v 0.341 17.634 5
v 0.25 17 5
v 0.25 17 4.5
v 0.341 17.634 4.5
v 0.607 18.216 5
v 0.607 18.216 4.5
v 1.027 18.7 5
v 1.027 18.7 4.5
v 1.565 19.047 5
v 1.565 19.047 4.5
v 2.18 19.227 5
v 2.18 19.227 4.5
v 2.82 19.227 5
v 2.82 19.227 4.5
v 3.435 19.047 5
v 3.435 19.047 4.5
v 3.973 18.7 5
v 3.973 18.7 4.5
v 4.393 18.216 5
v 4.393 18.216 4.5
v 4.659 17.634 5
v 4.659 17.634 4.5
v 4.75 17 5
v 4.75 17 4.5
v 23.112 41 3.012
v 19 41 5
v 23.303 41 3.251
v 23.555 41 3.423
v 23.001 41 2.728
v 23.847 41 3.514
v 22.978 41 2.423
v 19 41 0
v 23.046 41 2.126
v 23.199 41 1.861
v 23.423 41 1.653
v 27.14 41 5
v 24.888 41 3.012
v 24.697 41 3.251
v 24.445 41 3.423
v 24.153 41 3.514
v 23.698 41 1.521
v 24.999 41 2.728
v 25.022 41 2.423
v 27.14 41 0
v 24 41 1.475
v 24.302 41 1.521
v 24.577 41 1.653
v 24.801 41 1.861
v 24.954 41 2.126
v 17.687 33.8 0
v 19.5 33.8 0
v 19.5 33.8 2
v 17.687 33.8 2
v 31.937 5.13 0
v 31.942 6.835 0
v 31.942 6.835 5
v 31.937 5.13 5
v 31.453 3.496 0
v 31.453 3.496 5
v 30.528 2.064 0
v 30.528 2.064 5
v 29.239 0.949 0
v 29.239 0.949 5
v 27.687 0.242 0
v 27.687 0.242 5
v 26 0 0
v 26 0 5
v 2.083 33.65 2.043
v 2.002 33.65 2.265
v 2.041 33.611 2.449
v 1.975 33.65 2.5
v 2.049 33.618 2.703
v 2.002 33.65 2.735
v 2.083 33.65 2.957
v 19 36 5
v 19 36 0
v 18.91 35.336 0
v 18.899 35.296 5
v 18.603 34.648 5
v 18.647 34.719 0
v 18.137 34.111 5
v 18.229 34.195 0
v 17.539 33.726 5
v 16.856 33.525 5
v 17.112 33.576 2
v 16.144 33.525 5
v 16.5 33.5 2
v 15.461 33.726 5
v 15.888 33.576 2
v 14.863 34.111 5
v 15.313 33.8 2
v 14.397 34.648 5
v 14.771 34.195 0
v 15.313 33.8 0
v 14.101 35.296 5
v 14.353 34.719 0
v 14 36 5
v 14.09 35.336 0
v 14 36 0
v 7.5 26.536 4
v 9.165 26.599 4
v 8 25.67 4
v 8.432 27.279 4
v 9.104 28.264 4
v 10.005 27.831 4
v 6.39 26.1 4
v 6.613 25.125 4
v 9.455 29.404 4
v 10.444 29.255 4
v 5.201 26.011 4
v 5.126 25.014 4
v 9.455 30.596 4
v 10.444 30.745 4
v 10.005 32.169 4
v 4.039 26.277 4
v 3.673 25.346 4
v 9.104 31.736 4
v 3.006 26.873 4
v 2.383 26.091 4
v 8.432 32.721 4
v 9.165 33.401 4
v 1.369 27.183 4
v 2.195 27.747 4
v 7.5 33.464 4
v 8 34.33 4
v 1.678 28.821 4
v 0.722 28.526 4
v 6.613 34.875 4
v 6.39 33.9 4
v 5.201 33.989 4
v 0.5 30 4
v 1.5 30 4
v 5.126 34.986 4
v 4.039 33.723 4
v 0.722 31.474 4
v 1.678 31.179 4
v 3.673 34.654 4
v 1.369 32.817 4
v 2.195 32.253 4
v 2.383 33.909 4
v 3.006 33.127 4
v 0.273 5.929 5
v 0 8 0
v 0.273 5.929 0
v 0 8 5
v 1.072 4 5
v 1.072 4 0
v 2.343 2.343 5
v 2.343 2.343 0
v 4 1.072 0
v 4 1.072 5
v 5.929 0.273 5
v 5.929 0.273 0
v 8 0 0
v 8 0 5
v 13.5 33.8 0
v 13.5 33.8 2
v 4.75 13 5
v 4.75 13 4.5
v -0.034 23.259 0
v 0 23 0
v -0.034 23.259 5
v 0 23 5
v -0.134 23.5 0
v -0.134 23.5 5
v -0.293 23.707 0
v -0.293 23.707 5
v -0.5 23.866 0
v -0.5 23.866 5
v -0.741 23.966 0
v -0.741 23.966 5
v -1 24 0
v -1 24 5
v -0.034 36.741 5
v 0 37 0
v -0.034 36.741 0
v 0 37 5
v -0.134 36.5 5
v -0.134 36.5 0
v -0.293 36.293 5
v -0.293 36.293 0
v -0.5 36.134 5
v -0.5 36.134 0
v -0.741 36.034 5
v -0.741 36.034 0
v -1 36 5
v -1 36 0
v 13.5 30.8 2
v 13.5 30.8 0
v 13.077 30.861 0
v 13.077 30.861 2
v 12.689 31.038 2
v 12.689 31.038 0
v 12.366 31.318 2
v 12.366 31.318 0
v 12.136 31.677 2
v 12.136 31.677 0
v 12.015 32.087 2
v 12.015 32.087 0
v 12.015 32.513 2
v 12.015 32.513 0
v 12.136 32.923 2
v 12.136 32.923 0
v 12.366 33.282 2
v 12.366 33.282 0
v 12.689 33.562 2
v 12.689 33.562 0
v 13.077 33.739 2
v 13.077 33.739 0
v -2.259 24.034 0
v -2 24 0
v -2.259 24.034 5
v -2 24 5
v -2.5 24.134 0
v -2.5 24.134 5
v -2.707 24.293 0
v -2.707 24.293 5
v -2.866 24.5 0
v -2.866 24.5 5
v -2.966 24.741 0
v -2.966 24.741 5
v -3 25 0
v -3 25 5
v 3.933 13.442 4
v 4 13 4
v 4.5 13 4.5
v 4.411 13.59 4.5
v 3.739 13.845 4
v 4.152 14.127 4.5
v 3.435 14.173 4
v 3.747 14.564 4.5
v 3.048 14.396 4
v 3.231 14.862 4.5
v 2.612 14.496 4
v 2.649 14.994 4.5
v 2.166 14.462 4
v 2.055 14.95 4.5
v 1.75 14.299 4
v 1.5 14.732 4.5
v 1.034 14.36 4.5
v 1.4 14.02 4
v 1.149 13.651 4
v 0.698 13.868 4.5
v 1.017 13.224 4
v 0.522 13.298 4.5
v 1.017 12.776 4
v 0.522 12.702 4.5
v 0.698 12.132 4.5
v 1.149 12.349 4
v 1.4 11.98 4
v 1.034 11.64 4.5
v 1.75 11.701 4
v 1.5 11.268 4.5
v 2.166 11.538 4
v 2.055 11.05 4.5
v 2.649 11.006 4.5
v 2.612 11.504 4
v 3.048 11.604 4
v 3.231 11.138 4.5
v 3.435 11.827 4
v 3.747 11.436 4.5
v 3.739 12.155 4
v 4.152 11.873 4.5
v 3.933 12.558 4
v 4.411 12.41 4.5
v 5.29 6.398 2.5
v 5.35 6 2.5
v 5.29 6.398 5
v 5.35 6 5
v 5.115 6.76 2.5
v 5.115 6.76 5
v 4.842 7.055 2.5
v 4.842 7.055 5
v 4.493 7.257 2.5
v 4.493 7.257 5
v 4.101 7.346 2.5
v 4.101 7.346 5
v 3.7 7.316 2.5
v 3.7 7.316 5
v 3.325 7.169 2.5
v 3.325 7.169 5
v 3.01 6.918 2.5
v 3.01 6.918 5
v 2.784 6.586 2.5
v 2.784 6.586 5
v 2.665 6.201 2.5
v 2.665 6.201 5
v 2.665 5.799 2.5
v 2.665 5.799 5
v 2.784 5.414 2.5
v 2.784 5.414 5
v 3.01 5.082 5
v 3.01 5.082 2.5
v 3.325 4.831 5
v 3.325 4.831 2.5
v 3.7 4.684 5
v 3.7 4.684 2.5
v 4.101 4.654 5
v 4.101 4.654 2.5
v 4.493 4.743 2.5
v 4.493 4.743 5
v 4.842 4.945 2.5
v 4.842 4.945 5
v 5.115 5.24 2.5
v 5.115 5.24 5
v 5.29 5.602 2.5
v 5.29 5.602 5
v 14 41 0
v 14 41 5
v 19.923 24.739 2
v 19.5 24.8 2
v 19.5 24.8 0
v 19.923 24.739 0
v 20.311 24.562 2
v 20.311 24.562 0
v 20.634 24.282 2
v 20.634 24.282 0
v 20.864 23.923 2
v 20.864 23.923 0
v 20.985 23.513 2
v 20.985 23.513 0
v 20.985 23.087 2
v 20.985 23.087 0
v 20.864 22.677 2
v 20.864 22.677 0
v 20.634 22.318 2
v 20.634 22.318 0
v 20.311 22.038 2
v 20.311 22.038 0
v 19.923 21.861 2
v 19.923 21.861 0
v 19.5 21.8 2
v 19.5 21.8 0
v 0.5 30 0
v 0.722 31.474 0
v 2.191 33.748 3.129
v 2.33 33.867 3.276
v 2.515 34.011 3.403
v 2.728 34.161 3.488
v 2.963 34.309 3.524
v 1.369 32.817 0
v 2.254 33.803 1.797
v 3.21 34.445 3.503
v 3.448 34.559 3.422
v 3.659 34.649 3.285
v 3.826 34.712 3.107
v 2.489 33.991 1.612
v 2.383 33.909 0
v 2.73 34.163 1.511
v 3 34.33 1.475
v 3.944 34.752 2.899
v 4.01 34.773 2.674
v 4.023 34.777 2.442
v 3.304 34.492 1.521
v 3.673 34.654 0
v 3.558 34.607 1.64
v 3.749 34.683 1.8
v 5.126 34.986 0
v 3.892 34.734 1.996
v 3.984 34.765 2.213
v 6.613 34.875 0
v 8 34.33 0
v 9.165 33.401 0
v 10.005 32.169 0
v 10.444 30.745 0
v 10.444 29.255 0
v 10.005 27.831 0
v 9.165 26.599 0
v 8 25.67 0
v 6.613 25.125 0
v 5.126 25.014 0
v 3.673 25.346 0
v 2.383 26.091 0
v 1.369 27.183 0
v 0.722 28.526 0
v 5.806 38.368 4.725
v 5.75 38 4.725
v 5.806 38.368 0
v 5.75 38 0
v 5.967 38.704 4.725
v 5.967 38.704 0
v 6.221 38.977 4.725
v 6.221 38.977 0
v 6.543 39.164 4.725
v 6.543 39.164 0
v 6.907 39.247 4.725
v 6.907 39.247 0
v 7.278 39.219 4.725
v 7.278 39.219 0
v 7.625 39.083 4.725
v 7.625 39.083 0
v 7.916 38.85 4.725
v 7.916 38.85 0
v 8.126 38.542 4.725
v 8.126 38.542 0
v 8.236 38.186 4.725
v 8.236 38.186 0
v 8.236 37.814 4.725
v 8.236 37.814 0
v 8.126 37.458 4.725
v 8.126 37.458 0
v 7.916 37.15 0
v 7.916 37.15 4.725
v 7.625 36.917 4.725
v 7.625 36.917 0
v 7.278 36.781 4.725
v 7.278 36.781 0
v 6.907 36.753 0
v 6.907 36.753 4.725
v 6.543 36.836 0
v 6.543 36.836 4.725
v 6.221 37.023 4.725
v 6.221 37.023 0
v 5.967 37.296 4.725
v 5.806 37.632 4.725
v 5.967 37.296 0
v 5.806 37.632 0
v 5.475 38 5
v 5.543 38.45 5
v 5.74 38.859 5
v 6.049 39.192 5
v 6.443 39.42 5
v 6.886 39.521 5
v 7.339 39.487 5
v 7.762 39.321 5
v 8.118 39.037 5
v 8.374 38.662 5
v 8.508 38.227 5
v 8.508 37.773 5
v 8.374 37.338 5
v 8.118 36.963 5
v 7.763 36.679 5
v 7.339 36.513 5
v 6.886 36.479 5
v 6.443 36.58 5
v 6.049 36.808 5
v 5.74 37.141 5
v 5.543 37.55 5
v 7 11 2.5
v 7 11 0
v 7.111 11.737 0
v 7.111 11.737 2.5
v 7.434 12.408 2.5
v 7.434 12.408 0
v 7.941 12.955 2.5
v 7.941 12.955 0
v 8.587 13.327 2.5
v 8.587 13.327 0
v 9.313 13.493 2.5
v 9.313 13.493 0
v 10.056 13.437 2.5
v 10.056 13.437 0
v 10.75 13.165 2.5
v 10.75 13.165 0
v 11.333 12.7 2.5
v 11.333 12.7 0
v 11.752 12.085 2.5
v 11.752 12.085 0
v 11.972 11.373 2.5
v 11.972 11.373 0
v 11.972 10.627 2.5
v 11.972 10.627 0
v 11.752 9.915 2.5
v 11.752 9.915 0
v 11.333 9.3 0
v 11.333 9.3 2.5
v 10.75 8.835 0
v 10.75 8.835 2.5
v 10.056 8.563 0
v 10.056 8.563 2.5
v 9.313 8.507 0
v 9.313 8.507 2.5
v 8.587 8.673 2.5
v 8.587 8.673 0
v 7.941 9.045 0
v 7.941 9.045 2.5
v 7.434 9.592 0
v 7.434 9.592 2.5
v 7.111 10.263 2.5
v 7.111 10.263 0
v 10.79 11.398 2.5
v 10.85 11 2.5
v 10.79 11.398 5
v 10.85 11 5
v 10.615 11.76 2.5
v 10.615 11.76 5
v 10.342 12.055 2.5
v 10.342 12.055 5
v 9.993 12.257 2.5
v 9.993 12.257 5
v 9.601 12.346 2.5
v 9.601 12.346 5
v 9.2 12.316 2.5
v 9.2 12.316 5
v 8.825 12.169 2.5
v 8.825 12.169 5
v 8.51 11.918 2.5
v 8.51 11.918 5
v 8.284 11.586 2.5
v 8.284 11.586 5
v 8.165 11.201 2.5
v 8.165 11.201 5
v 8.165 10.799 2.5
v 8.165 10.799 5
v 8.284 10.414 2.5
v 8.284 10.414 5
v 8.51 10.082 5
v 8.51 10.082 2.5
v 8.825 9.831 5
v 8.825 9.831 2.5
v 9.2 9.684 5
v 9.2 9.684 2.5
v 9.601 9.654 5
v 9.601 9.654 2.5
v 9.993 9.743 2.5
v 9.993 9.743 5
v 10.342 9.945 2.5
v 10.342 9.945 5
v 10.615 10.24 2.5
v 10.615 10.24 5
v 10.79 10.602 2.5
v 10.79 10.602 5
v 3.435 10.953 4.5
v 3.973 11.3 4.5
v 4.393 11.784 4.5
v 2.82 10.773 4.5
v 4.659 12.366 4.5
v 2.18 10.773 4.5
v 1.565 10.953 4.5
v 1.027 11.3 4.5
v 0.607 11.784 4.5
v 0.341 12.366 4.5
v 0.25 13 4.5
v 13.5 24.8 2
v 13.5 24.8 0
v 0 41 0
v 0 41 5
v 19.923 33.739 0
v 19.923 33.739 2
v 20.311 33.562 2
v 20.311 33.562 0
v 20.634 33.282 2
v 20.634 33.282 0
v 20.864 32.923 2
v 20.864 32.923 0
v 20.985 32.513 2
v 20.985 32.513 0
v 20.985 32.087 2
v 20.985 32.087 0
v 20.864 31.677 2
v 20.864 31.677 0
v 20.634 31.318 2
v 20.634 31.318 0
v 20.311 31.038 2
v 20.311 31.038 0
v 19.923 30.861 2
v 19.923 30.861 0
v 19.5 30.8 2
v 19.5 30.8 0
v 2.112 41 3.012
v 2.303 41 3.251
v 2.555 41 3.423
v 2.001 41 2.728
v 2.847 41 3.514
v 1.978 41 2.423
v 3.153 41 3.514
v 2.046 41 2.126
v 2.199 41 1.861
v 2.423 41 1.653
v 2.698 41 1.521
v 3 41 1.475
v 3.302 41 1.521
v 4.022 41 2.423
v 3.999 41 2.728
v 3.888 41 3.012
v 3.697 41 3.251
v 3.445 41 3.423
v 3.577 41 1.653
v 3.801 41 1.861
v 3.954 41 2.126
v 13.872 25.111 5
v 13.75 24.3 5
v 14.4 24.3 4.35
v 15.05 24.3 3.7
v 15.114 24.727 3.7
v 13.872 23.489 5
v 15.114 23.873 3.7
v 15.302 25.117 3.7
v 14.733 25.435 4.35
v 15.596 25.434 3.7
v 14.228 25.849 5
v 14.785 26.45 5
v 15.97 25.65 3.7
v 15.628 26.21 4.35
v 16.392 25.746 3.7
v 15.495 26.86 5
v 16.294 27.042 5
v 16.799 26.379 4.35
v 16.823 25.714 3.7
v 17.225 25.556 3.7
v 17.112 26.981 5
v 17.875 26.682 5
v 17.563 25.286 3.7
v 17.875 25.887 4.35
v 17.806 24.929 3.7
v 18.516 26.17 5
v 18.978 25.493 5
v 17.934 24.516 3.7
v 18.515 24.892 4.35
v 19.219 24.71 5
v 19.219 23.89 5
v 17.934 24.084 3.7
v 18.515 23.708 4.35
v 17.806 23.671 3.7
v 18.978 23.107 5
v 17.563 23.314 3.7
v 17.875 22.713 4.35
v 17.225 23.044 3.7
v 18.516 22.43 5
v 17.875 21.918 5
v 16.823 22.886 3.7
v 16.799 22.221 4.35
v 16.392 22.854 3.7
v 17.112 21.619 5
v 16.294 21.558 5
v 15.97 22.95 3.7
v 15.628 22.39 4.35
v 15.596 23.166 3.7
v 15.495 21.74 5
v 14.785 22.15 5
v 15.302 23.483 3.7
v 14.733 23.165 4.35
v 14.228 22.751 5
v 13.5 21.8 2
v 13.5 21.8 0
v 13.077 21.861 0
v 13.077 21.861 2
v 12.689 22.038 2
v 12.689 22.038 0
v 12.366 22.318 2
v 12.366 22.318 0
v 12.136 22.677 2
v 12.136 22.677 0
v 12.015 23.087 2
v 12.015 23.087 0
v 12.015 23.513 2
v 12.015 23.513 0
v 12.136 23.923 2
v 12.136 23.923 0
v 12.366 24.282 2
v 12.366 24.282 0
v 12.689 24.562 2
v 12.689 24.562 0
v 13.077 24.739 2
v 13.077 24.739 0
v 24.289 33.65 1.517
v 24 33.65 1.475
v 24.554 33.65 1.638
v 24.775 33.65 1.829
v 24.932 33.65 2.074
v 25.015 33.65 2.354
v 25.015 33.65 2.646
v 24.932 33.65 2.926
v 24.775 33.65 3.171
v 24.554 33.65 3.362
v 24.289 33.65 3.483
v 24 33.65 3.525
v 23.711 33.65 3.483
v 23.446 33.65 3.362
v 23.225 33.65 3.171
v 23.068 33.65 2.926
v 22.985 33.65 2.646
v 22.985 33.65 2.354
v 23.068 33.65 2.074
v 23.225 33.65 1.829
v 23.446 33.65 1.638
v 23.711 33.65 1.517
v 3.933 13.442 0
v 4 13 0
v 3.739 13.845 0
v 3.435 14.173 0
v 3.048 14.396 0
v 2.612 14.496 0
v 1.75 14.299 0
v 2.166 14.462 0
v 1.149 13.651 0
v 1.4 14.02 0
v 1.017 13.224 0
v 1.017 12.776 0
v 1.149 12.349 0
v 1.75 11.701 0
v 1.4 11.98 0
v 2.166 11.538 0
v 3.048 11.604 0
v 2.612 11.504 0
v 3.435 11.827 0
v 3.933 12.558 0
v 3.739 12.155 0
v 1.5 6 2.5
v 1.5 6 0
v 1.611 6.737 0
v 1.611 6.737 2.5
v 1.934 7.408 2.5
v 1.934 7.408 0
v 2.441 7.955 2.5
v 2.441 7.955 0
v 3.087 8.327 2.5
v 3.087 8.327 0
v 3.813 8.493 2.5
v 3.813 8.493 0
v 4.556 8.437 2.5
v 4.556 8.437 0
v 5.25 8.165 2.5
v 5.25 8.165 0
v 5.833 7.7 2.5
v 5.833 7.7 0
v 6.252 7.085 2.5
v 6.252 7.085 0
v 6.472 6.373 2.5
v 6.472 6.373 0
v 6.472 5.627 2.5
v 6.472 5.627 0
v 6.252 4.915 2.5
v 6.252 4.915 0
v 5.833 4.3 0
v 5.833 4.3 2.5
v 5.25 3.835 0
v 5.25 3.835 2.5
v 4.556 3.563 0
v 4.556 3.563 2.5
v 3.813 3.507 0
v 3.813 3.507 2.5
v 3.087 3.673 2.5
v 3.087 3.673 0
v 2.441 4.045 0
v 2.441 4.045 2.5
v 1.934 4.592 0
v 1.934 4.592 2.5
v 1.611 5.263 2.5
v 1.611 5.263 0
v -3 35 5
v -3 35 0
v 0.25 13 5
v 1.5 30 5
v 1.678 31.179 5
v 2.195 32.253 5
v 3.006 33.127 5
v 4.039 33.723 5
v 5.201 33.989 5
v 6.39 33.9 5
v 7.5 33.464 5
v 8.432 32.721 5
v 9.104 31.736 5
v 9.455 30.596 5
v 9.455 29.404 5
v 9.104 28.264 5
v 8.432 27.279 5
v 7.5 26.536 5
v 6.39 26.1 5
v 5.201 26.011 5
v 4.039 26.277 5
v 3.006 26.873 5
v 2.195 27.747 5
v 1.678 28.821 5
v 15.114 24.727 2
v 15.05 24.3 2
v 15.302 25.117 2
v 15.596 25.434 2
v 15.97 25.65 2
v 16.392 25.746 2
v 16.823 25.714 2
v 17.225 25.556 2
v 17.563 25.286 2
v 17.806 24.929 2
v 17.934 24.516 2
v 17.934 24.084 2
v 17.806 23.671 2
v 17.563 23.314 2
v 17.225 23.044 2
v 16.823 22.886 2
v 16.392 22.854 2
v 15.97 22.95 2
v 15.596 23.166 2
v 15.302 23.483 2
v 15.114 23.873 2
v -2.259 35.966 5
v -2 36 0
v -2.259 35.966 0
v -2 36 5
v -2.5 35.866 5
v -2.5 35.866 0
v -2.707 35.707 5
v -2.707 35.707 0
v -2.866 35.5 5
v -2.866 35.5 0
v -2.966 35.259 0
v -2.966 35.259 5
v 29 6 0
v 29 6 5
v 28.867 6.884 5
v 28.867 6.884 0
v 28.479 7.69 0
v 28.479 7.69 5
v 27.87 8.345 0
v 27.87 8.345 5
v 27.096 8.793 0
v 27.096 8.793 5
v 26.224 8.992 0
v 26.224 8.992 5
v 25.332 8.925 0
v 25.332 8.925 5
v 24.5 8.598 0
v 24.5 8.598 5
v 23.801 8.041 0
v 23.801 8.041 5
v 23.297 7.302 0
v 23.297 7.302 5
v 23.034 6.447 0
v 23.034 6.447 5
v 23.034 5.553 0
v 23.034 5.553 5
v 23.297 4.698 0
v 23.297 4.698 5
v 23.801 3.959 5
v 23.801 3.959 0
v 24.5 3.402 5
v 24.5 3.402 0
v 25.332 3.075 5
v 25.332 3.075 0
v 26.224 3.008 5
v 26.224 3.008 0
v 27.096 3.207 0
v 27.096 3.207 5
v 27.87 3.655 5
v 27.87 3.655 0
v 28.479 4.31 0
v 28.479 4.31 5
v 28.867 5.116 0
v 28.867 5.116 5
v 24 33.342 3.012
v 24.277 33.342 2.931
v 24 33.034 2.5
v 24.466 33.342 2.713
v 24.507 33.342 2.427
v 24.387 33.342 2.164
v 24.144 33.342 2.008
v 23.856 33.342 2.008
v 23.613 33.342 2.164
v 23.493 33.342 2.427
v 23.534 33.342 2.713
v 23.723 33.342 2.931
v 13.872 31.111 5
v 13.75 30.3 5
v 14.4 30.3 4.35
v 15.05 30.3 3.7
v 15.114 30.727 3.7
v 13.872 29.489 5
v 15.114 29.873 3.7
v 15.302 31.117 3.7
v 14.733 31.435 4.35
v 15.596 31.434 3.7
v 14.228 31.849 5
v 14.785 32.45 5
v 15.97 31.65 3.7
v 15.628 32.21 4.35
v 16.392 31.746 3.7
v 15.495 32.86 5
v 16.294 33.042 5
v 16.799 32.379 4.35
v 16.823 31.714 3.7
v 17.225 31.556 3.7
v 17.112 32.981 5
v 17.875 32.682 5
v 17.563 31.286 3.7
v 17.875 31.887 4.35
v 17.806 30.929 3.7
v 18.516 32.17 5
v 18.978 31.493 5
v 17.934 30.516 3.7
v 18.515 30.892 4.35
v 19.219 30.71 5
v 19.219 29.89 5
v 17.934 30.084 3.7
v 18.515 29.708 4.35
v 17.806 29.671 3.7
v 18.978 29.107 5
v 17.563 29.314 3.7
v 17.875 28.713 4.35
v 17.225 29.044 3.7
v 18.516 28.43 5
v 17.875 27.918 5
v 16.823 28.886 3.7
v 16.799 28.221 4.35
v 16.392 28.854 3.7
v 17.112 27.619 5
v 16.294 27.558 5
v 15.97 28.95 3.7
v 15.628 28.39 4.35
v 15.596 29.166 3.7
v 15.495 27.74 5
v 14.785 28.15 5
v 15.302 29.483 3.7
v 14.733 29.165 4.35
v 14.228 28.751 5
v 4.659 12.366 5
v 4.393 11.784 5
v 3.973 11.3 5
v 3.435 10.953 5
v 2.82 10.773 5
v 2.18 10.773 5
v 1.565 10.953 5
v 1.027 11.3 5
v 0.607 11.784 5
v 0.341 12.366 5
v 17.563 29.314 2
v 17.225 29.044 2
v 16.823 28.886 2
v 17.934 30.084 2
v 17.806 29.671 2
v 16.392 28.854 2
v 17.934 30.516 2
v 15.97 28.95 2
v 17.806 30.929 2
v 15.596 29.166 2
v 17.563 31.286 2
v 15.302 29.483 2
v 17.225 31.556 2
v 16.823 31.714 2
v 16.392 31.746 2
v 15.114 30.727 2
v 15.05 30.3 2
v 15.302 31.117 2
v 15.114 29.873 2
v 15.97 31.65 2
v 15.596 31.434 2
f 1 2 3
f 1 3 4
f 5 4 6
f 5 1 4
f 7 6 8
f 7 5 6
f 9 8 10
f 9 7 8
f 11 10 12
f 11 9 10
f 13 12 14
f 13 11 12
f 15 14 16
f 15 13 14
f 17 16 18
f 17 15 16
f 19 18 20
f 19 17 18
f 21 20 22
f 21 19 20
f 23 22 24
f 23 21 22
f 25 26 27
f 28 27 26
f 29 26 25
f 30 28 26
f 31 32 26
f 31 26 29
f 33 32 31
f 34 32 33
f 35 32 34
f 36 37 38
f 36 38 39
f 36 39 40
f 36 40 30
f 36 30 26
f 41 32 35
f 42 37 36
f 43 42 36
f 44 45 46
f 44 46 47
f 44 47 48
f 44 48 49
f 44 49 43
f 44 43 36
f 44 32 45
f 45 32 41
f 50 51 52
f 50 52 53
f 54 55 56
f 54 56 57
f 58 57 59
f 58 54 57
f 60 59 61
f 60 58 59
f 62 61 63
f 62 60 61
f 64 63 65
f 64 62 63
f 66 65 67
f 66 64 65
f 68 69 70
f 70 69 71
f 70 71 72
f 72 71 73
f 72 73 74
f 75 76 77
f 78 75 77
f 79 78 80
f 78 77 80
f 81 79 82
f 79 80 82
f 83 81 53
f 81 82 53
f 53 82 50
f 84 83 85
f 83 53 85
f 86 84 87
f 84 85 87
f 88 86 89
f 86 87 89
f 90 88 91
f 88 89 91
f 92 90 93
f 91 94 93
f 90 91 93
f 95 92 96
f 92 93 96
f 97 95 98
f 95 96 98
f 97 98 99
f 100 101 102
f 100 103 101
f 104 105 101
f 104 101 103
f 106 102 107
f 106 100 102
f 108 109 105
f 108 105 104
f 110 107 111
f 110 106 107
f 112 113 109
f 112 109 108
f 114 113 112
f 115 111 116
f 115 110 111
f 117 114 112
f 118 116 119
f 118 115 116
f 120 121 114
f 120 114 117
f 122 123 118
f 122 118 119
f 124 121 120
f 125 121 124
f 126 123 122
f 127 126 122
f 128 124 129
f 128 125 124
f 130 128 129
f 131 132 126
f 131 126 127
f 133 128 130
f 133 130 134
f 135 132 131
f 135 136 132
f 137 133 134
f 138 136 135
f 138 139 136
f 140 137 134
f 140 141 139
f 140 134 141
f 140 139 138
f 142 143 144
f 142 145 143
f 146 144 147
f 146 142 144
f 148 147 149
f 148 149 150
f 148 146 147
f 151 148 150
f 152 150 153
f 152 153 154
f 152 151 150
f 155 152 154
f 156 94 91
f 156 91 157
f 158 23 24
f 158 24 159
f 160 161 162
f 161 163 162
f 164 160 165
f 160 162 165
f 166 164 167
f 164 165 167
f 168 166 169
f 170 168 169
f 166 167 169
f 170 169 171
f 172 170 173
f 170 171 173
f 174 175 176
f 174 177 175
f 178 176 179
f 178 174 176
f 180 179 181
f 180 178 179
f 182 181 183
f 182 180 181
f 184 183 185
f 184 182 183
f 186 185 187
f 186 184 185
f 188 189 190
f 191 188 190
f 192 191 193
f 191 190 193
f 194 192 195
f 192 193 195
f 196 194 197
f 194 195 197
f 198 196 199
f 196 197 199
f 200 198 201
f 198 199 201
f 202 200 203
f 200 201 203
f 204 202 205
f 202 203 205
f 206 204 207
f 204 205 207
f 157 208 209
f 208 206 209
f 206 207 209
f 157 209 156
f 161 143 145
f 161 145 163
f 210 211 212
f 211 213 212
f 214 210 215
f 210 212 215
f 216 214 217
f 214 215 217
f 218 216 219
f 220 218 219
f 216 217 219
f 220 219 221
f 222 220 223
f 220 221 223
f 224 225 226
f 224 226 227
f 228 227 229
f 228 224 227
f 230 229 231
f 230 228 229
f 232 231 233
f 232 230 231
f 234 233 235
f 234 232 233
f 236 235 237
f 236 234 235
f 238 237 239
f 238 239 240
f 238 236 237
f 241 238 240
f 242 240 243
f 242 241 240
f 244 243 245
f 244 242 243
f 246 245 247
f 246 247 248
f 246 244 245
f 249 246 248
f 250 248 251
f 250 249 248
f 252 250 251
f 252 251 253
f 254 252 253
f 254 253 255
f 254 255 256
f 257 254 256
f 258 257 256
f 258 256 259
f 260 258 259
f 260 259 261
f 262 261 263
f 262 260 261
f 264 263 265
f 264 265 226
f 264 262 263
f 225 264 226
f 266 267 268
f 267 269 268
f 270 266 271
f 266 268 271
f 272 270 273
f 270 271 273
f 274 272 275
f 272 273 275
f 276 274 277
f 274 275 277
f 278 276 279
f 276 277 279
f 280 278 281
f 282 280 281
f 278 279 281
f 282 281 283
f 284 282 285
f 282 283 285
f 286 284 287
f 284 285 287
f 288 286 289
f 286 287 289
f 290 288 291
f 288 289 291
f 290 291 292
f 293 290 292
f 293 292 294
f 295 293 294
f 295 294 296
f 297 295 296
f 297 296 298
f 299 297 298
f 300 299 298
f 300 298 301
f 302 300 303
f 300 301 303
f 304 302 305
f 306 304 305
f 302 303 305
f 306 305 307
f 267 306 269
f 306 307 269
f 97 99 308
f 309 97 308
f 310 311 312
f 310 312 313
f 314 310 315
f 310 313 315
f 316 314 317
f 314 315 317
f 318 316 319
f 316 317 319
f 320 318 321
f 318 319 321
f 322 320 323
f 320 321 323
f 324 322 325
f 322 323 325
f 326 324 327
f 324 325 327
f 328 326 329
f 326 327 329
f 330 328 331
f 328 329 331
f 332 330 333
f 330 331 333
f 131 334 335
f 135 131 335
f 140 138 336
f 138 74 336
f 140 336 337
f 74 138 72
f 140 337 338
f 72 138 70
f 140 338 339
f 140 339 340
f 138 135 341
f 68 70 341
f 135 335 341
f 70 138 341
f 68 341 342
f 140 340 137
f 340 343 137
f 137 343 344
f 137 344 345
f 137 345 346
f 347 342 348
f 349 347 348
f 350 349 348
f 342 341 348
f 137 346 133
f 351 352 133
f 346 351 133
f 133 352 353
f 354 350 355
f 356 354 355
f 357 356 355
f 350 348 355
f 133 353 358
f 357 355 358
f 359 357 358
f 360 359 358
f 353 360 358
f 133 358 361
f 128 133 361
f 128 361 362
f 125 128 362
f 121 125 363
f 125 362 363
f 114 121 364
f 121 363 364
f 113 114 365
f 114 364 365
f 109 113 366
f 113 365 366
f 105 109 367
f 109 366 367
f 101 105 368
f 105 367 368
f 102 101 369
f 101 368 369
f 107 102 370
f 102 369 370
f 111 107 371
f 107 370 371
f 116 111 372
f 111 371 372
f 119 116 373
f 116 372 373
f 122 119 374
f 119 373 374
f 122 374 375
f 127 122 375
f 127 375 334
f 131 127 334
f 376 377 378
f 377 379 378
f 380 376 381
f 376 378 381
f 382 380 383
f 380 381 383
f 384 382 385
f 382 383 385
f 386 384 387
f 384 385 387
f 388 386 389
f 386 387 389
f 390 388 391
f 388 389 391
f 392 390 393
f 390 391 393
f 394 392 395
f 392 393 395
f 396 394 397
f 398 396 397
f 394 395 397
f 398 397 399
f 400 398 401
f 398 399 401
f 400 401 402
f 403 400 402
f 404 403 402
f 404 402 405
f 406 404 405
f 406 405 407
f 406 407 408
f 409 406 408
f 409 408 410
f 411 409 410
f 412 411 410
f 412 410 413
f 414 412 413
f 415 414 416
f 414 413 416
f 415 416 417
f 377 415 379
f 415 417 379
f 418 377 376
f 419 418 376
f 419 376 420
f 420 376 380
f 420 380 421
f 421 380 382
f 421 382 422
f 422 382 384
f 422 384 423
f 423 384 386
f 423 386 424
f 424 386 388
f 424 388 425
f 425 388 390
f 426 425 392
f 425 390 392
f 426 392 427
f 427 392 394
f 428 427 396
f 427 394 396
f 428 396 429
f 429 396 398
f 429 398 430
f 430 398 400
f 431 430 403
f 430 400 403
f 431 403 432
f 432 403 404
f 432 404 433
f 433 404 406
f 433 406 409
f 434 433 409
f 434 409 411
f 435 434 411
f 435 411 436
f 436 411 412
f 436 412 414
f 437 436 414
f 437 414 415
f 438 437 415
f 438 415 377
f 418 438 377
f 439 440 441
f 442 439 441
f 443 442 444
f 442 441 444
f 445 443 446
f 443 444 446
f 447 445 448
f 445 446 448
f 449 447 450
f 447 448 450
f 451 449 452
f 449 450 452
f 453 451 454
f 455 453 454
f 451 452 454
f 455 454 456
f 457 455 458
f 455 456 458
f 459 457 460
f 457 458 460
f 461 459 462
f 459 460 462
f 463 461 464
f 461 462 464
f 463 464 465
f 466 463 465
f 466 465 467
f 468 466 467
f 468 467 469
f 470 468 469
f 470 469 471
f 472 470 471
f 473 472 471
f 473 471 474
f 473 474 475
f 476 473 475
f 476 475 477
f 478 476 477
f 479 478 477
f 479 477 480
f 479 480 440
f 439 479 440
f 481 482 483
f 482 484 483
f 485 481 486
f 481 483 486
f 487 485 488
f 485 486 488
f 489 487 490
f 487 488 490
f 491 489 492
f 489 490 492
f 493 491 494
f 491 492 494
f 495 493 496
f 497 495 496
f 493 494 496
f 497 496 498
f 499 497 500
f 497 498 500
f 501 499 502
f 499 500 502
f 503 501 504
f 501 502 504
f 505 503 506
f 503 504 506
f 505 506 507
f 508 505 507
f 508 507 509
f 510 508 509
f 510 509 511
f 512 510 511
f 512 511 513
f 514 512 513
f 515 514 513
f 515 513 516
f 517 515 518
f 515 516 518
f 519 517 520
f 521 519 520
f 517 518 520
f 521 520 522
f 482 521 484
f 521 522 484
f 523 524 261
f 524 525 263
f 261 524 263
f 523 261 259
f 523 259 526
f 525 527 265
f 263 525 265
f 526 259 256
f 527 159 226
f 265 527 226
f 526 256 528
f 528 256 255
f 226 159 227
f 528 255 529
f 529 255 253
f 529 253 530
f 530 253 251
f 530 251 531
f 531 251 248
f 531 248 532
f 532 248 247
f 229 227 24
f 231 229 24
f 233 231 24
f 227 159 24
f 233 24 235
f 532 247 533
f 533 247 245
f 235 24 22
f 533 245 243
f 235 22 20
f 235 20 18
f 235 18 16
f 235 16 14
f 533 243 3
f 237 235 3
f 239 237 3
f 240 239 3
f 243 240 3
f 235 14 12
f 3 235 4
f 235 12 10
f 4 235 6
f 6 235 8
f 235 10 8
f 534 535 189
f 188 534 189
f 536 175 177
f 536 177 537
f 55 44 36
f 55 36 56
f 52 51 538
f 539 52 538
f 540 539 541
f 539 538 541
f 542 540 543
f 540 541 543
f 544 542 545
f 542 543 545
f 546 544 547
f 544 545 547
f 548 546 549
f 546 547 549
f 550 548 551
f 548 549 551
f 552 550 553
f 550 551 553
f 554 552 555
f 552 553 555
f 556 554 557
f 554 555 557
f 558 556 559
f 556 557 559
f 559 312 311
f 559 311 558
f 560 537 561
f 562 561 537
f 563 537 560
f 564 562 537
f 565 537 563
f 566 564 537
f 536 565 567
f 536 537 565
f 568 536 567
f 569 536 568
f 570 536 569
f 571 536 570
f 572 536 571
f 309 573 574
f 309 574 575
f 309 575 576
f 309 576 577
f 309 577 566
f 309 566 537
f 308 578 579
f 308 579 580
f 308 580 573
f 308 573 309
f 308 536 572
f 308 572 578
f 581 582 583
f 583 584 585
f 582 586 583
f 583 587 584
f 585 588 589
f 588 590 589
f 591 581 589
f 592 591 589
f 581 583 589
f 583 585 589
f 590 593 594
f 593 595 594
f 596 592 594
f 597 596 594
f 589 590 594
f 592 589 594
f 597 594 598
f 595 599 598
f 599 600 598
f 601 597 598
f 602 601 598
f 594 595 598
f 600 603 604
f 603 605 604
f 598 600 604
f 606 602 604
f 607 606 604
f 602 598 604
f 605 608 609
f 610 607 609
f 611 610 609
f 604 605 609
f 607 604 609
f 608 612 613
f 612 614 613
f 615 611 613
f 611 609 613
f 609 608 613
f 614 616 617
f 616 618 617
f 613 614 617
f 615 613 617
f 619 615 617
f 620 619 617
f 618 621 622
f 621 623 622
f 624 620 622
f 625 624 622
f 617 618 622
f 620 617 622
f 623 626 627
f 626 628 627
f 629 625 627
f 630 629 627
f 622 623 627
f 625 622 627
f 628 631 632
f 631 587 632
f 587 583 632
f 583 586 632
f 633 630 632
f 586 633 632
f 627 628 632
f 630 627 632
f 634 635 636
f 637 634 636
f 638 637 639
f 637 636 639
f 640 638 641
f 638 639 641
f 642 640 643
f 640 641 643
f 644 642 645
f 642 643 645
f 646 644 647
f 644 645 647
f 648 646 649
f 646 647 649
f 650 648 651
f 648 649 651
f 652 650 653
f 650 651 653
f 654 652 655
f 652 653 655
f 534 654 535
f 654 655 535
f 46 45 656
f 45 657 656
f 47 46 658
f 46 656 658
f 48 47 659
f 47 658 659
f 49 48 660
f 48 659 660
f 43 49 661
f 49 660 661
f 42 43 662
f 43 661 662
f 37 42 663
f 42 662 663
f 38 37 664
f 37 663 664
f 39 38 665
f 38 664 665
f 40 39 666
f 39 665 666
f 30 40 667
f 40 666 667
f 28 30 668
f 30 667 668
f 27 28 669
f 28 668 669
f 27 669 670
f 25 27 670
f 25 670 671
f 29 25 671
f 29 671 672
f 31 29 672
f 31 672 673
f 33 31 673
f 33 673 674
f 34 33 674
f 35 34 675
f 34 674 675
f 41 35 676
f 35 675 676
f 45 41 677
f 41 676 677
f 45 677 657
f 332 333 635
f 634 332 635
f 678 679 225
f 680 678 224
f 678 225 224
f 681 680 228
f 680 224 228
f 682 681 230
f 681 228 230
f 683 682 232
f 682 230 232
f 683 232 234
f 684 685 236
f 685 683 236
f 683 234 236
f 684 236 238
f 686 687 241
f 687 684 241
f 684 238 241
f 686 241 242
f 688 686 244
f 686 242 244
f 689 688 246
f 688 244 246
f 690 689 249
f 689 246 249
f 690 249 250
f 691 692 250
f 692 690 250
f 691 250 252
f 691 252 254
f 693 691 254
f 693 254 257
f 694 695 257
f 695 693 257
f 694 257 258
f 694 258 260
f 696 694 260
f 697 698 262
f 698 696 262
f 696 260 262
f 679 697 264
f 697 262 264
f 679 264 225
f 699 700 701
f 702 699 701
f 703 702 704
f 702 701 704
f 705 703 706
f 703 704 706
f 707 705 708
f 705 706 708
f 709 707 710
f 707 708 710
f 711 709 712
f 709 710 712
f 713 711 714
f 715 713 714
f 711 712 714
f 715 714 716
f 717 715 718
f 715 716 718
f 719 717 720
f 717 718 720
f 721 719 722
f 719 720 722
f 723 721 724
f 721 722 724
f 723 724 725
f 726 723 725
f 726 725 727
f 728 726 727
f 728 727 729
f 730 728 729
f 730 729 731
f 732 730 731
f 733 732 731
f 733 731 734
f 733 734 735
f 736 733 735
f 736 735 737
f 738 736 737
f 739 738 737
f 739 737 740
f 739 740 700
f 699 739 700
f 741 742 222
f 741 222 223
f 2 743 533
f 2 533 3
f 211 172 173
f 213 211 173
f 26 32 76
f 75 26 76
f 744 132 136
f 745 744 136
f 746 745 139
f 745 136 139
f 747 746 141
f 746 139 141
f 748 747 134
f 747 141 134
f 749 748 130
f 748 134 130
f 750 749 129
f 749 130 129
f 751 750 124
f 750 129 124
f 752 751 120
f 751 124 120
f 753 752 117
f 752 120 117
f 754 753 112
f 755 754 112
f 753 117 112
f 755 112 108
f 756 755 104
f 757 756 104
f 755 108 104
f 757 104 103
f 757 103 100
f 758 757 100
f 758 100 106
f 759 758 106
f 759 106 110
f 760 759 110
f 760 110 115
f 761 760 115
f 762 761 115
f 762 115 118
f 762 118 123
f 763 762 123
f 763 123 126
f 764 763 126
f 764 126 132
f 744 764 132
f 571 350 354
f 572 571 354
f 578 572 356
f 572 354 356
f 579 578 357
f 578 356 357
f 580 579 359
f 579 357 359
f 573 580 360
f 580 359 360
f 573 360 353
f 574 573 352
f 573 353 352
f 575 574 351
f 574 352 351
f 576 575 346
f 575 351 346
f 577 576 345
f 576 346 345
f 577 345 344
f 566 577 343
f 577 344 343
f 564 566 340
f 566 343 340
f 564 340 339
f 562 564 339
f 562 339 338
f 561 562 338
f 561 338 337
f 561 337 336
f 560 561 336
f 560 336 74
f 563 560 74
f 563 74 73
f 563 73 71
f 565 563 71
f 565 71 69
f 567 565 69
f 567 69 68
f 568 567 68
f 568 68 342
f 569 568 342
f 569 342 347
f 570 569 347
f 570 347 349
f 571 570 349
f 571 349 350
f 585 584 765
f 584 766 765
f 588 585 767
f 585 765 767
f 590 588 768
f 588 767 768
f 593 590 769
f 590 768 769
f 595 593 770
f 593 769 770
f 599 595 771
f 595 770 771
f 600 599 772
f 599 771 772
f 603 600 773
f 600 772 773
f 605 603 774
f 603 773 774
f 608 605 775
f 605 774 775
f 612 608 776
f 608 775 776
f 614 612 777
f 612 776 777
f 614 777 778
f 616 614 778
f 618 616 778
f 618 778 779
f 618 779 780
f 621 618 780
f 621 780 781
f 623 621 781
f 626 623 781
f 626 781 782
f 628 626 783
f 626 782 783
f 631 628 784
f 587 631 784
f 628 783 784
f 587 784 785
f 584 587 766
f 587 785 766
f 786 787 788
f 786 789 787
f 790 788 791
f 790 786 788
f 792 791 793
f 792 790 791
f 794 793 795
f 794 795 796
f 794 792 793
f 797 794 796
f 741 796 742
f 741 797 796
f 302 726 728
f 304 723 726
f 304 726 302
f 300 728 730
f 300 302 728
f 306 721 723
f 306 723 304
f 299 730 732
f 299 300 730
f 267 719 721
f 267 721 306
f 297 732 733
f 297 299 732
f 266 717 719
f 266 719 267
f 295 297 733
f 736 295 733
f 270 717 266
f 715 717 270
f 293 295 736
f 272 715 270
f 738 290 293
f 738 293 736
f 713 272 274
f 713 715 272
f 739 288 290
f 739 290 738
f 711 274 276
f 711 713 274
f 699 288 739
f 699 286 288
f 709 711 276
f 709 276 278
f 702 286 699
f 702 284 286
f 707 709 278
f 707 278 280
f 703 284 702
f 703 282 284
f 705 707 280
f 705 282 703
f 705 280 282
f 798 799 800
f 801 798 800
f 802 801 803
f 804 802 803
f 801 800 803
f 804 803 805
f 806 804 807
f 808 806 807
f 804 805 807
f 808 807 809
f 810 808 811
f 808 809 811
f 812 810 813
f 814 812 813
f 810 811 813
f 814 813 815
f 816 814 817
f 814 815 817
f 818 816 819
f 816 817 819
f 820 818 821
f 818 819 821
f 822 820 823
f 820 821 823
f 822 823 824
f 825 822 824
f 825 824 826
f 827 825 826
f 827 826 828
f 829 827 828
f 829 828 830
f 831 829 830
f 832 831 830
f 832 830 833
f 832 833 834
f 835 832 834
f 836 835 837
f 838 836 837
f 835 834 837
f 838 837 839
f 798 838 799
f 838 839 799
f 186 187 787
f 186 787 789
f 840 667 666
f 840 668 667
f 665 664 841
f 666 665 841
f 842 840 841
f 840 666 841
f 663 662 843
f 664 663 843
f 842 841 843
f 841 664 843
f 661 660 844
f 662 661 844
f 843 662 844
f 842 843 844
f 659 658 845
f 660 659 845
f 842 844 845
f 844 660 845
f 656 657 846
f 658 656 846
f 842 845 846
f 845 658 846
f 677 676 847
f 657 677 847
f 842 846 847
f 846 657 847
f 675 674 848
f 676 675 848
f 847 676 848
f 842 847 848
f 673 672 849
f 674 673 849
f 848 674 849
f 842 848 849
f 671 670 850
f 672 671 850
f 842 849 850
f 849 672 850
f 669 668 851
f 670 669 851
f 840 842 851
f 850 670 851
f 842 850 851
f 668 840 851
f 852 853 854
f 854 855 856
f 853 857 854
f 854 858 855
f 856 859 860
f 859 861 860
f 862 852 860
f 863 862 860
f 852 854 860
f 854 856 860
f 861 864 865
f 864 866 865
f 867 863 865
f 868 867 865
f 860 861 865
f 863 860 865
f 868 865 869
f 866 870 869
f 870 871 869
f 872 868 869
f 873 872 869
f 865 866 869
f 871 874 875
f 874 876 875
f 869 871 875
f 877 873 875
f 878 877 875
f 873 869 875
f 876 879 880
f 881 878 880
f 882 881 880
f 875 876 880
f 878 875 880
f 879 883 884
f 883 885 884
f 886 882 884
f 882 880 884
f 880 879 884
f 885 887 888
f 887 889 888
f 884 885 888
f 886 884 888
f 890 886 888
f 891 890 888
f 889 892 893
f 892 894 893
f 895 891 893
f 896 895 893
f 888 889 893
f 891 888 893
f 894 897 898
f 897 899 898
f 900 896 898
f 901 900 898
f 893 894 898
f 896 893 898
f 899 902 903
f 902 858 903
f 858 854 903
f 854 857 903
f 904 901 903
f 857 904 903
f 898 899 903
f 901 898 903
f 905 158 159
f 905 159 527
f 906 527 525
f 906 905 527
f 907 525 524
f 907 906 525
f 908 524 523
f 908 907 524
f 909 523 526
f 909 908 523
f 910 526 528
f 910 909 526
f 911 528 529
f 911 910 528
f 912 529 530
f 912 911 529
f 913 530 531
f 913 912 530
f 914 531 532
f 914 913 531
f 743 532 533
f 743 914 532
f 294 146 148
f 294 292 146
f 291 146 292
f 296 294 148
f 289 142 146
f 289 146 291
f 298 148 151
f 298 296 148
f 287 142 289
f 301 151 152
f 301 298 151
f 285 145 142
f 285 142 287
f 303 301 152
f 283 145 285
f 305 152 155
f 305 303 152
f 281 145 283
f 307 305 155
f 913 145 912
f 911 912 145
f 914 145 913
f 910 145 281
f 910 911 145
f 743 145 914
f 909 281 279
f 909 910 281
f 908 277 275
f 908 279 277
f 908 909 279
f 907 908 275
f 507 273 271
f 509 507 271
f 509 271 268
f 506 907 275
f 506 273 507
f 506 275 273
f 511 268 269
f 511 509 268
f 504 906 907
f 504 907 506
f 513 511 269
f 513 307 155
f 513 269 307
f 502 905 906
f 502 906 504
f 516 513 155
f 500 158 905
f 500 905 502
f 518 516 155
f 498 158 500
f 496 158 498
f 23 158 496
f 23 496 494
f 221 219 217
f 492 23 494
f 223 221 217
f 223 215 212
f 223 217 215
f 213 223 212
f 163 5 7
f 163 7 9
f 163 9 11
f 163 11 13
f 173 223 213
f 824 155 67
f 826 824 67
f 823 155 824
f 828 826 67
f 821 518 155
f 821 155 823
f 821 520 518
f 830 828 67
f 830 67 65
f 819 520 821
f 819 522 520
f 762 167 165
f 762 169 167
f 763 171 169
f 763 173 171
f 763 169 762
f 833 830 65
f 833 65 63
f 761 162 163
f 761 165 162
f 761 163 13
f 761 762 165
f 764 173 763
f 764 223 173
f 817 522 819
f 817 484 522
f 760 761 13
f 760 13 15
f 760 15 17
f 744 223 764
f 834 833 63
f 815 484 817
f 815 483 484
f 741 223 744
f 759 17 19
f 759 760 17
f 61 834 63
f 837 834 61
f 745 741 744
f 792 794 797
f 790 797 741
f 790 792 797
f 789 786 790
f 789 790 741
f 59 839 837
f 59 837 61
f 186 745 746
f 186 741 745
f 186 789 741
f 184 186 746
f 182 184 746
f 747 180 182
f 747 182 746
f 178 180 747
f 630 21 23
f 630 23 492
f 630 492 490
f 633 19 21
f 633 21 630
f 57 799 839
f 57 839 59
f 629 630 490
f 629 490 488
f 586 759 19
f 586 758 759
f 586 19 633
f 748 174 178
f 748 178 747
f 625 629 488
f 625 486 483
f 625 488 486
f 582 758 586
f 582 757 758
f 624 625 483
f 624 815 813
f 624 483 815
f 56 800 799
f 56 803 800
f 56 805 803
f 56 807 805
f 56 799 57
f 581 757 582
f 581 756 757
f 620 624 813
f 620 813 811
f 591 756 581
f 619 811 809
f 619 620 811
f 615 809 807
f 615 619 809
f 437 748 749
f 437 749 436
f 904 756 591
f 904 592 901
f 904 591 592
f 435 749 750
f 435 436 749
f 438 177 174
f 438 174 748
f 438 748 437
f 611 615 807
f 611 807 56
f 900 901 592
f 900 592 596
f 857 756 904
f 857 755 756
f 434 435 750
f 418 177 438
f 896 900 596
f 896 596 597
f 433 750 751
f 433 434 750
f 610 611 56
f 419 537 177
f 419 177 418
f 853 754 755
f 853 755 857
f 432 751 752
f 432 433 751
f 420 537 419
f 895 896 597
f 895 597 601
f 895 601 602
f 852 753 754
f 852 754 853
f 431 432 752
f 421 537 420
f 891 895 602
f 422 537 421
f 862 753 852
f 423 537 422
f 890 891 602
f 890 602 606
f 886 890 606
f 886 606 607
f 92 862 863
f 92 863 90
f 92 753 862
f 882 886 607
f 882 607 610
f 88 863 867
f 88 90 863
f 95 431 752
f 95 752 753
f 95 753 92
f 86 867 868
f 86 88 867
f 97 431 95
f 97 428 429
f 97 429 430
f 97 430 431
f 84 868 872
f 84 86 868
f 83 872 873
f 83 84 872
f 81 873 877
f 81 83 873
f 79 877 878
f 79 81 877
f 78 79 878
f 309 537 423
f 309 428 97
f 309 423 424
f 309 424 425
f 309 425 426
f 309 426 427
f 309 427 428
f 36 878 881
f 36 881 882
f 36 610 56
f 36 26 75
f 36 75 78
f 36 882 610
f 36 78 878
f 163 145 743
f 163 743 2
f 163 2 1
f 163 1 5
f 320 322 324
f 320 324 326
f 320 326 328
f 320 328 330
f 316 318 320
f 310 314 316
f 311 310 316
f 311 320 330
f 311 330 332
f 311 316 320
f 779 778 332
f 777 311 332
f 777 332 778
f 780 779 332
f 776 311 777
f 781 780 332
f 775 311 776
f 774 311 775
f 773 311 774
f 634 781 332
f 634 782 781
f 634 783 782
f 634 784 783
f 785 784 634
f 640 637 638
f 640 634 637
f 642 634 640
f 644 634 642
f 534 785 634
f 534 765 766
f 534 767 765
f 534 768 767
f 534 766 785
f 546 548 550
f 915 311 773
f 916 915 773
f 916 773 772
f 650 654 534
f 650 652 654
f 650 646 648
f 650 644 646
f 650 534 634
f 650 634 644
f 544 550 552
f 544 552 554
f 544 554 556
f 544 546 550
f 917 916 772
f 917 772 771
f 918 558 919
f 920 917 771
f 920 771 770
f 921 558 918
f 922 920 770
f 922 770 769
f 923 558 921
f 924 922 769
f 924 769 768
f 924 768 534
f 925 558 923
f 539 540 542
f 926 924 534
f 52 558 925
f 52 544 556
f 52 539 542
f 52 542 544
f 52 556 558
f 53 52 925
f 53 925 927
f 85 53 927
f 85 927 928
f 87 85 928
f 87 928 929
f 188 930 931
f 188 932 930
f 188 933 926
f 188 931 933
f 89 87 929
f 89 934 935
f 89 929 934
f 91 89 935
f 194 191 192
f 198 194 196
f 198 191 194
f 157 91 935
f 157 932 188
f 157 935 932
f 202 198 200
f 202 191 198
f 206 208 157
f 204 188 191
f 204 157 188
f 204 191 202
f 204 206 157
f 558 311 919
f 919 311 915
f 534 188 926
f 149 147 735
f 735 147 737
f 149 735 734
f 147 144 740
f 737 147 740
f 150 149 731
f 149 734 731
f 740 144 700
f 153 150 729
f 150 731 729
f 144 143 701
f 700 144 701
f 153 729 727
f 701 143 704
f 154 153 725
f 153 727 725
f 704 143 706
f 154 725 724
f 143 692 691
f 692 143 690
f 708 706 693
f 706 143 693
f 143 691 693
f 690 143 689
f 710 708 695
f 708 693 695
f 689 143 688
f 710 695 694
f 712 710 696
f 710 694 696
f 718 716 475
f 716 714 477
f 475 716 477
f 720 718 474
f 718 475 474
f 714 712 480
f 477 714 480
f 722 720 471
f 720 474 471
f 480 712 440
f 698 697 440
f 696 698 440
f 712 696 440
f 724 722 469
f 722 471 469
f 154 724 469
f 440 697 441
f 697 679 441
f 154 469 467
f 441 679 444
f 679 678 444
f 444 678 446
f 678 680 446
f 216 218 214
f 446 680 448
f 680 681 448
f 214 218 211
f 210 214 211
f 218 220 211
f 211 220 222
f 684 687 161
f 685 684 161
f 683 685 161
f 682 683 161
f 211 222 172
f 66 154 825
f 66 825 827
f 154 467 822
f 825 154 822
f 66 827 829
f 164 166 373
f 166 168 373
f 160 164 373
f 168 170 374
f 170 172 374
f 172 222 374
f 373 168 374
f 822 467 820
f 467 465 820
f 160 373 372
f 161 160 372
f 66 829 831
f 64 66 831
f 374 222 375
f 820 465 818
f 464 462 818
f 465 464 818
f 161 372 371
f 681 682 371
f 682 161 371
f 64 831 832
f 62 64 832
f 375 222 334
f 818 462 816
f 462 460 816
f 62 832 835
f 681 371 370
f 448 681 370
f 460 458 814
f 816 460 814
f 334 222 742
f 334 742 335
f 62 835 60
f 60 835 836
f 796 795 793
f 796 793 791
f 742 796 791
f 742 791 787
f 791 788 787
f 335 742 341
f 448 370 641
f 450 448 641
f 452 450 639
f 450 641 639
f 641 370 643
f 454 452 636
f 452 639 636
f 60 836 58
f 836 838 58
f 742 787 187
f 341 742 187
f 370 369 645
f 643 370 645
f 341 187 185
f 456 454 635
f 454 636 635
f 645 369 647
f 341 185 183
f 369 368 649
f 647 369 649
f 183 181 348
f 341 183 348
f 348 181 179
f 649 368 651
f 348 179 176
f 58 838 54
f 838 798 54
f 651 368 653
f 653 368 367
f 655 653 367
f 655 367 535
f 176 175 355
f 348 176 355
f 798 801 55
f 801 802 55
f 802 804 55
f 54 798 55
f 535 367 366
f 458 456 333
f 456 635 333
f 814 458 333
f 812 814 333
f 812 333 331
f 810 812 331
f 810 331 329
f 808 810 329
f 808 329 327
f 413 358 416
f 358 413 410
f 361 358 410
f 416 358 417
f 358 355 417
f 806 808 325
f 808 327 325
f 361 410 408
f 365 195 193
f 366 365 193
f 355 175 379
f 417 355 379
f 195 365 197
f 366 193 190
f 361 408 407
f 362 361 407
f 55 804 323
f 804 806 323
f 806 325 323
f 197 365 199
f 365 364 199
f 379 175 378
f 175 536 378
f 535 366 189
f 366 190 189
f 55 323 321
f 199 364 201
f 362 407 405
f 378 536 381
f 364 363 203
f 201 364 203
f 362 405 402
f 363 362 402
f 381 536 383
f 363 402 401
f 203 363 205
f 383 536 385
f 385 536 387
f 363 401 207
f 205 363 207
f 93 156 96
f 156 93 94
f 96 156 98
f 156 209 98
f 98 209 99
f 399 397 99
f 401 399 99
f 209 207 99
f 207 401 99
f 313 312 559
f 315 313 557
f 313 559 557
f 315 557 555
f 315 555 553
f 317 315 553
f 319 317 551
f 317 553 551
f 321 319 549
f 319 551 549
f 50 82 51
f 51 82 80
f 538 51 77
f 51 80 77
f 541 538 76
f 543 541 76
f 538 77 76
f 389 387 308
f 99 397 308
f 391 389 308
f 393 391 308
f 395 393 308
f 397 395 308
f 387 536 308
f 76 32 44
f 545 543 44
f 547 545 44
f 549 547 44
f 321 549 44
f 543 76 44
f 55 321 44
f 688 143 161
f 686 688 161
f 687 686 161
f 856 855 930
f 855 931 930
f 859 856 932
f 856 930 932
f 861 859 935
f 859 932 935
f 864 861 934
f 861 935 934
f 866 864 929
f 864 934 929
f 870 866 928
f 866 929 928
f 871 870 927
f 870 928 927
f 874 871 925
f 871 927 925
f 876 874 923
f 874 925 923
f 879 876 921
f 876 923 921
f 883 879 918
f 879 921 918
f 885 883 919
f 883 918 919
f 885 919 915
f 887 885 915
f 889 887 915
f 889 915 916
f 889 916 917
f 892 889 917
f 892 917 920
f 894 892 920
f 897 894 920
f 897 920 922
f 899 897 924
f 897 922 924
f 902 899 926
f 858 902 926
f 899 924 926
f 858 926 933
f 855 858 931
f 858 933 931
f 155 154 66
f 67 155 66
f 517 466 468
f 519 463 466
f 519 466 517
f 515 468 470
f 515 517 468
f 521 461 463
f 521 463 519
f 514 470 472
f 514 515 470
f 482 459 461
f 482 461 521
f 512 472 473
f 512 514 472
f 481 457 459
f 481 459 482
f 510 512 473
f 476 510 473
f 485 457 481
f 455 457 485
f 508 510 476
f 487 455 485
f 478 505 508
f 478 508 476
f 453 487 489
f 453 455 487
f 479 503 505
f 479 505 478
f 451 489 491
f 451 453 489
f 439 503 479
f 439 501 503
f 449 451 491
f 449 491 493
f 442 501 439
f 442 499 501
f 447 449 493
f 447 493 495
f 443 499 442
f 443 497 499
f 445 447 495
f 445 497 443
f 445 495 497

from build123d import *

# Parameters (mm, degrees)
SKETCH_1_W                                           = 34
SKETCH_1_H                                           = 41
EXTRUDE_1_DEPTH                                      = 5
FILLET_1_R                                           = 8
SKETCH_2_R                                           = 3
CUT_EXTRUDE_2_DEPTH                                  = 5
SKETCH_3_R                                           = 4
CUT_EXTRUDE_3_DEPTH                                  = 5
SKETCH_4_R                                           = 5
CUT_EXTRUDE_4_DEPTH                                  = 4
HOLE_WIZARD_M2_5_1_D                                 = 2.05
HOLE_WIZARD_M2_5_1_DEPTH                             = 7.35
HOLE_WIZARD_M2_5_1_TIP                               = 0.615882135
CUT_EXTRUDE_5_DEPTH                                  = 10
EXTRUDE1_START                                       = -5
EXTRUDE1_DEPTH                                       = 5
SKETCH_8_R                                           = 1.5
CUT_EXTRUDE_6_DEPTH                                  = 4.5
SKETCH9_R                                            = 0.5
EXTRUDE5_DEPTH                                       = 53.203927134
CUT_EXTRUDE_7_DEPTH                                  = 0.5
CHAMFER_3_SIZE                                       = 0.5
SKETCH2_W                                            = 6
SKETCH2_H                                            = 12
EXTRUDE2_DEPTH                                       = 2
SKETCH7_R                                            = 1.5
EXTRUDE3_DEPTH                                       = 2
EXTRUDE4_DEPTH                                       = 53.249401989
SKETCH10_R                                           = 1.5
EXTRUDE6_DEPTH                                       = 10
CBORE_FOR_M2_5_HEXAGON_SOCKET_HEAD_CAP_S_D           = 2.7
CBORE_FOR_M2_5_HEXAGON_SOCKET_HEAD_CAP_S_CBORE_D     = 5
CBORE_FOR_M2_5_HEXAGON_SOCKET_HEAD_CAP_S_CBORE_DEPTH = 2.5
HOLE_WIZARD_M2_5_1_2_D                               = 2.9
HOLE_WIZARD_M2_5_1_2_CSINK_D                         = 5.5
HOLE_WIZARD_M2_5_1_2_CSINK_ANGLE                     = 90
SKETCH_21_W                                          = 5
SKETCH_21_H                                          = 12
EXTRUDE_1_2_DEPTH                                    = 3
FILLET_2_R                                           = 1
M3X0_5_1_D                                           = 2.5
M3X0_5_1_CSINK_D                                     = 3.05
M3X0_5_1_CSINK_ANGLE                                 = 90


with BuildPart() as part:
    # 草图1 → Extrude 1 (new body)
    with BuildSketch(Plane.XY):
        with Locations((17, 20.5)):
            Rectangle(SKETCH_1_W, SKETCH_1_H)
    extrude(amount=EXTRUDE_1_DEPTH)

    # 圆角1
    fillet_1_edges = [part.edges().sort_by_distance(p)[0] for p in [
        (0, 0, 2.5),
    ]]
    fillet(fillet_1_edges, radius=FILLET_1_R)

    # 草图2 → 拉伸2 (cut)
    with BuildSketch(Plane.XY.offset(5)):
        with Locations((26, 6)):
            Circle(SKETCH_2_R)
    extrude(amount=-CUT_EXTRUDE_2_DEPTH, mode=Mode.SUBTRACT)

    # 草图3 → 拉伸3 (cut)
    with BuildSketch(Plane(origin=(0, 0, 0), x_dir=(-1, 0, 0), z_dir=(0, 0, -1))):
        with Locations((-5.5, 30)):
            Circle(SKETCH_3_R)
    extrude(amount=-CUT_EXTRUDE_3_DEPTH, mode=Mode.SUBTRACT)

    # 草图4 → 拉伸4 (cut)
    with BuildSketch(Plane(origin=(0, 0, 0), x_dir=(-1, 0, 0), z_dir=(0, 0, -1))):
        with Locations((-5.5, 30)):
            Circle(SKETCH_4_R)
    extrude(amount=-CUT_EXTRUDE_4_DEPTH, mode=Mode.SUBTRACT)

    # Hole Wizard M2.5 _1
    with Locations(Plane(origin=(3, 41, 2.5), x_dir=(0, 0, 1), z_dir=(0, 1, 0))):
        with Locations((0, 0), (0, 21)):
            Hole(HOLE_WIZARD_M2_5_1_D / 2, depth=HOLE_WIZARD_M2_5_1_DEPTH)
            with Locations((0, 0, -(HOLE_WIZARD_M2_5_1_DEPTH + HOLE_WIZARD_M2_5_1_TIP / 2))):  # 118° drill point
                Cone(0, HOLE_WIZARD_M2_5_1_D / 2, HOLE_WIZARD_M2_5_1_TIP, mode=Mode.SUBTRACT)

    # 草图7 → 拉伸5 (cut)
    with BuildSketch(Plane(origin=(0, 0, 0), x_dir=(-1, 0, 0), z_dir=(0, 0, -1))):
        with BuildLine():
            Line((-26, 0), (-34, 0))
            Line((-34, 0), (-34, 41))
            Line((-34, 41), (-27.140036221, 41))
            Line((-27.140036221, 41), (-31.941608412, 6.835038606))
            ThreePointArc((-31.941608412, 6.835038606), (-30.528257481, 2.063645826), (-26, 0))
        make_face()
    extrude(amount=-CUT_EXTRUDE_5_DEPTH, mode=Mode.SUBTRACT)

    # Sketch1 → Extrude1 (add)
    with BuildSketch(Plane.XY.offset(5).offset(EXTRUDE1_START)):
        with BuildLine():
            Line((26, 0), (12, 0))
            ThreePointArc((12, 0), (3.514718626, 3.514718626), (0, 12))
            Line((0, 12), (0, 12.980209143))
            Line((0, 12.980209143), (29.441458618, 1.085087734))
            ThreePointArc((29.441458618, 1.085087734), (27.804234797, 0.277698296), (26, 0))
        make_face()
    extrude(amount=EXTRUDE1_DEPTH)

    # 草图8 → 拉伸6 (cut)
    with BuildSketch(Plane.XY.offset(5)):
        with Locations((2.5, 13)):
            Circle(SKETCH_8_R)
    extrude(amount=-CUT_EXTRUDE_6_DEPTH, mode=Mode.SUBTRACT)

    # Sketch9 → Extrude5 (cut, through all)
    with BuildSketch(Plane.XY.offset(0.5)):
        with Locations((1.5, 13)):
            Circle(SKETCH9_R)
    extrude(amount=-EXTRUDE5_DEPTH, mode=Mode.SUBTRACT)

    # 草图9 → 拉伸7 (cut)
    with BuildSketch(Plane.XY.offset(5)):
        with BuildLine():
            Line((0.25, 13), (0.25, 17))
            ThreePointArc((0.25, 17), (2.5, 19.25), (4.75, 17))
            Line((4.75, 17), (4.75, 13))
            ThreePointArc((4.75, 13), (2.5, 10.75), (0.25, 13))
        make_face()
    extrude(amount=-CUT_EXTRUDE_7_DEPTH, mode=Mode.SUBTRACT)

    # 倒角3
    chamfer_3_edges = [part.edges().sort_by_distance(p)[0] for p in [
        (1, 13, 4.5),
    ]]
    chamfer(chamfer_3_edges, length=CHAMFER_3_SIZE)

    # Sketch2 → Extrude2 (cut)
    with BuildSketch(Plane(origin=(0, 0, 0), x_dir=(-1, 0, 0), z_dir=(0, 0, -1))):
        with Locations((-16.5, 27.8)):
            Rectangle(SKETCH2_W, SKETCH2_H)
    extrude(amount=-EXTRUDE2_DEPTH, mode=Mode.SUBTRACT)

    # Sketch7 → Extrude3 (cut)
    with BuildSketch(Plane(origin=(0, 0, 0), x_dir=(-1, 0, 0), z_dir=(0, 0, -1))):
        with Locations((-19.5, 32.3)):
            Circle(SKETCH7_R)
        with Locations((-13.5, 32.3)):
            Circle(SKETCH7_R)
        with Locations((-19.5, 23.3)):
            Circle(SKETCH7_R)
        with Locations((-13.5, 23.3)):
            Circle(SKETCH7_R)
    extrude(amount=-EXTRUDE3_DEPTH, mode=Mode.SUBTRACT)

    # Sketch8 → Extrude4 (cut, through all)
    with BuildSketch(Plane(origin=(0, 0, 0), x_dir=(-1, 0, 0), z_dir=(0, 0, -1))):
        with BuildLine():
            Line((-14, 36), (-14, 41))
            Line((-14, 41), (-19, 41))
            Line((-19, 41), (-19, 36))
            ThreePointArc((-19, 36), (-16.5, 33.5), (-14, 36))
        make_face()
    extrude(amount=-EXTRUDE4_DEPTH, mode=Mode.SUBTRACT)

    # Sketch10 → Extrude6 (cut)
    with BuildSketch(Plane.XY.offset(4.5)):
        with Locations((2.5, 13)):
            Circle(SKETCH10_R)
    extrude(amount=-EXTRUDE6_DEPTH, mode=Mode.SUBTRACT)

    # CBORE for M2.5 Hexagon socket head cap screws1 (through all)
    with Locations(Plane(origin=(4, 6, 0), x_dir=(-1, 0, 0), z_dir=(0, 0, -1))):
        with Locations((0, 0), (-5.5, 5)):
            CounterBoreHole(CBORE_FOR_M2_5_HEXAGON_SOCKET_HEAD_CAP_S_D / 2, CBORE_FOR_M2_5_HEXAGON_SOCKET_HEAD_CAP_S_CBORE_D / 2, CBORE_FOR_M2_5_HEXAGON_SOCKET_HEAD_CAP_S_CBORE_DEPTH)

    # Hole Wizard M2.5 _1 2 (through all)
    with Locations(Plane(origin=(16.5, 30.3, 5), x_dir=(1, 0, 0), z_dir=(0, 0, 1))):
        with Locations((0, 0), (0, -6)):
            CounterSinkHole(HOLE_WIZARD_M2_5_1_2_D / 2, HOLE_WIZARD_M2_5_1_2_CSINK_D / 2, counter_sink_angle=HOLE_WIZARD_M2_5_1_2_CSINK_ANGLE)

    # 草图21 → Extrude 1 2 (add)
    with BuildSketch(Plane.ZY):
        with Locations((2.5, 30)):
            Rectangle(SKETCH_21_W, SKETCH_21_H)
    extrude(amount=EXTRUDE_1_2_DEPTH)

    # 圆角2
    fillet_2_edges = [part.edges().sort_by_distance(p)[0] for p in [
        (0, 24, 2.5),
        (-3, 36, 2.5),
        (-3, 24, 2.5),
        (0, 36, 2.5),
    ]]
    fillet(fillet_2_edges, radius=FILLET_2_R)

    # M3x0.5 螺纹孔1 (through all)
    with Locations(Plane(origin=(7, 38, 5), x_dir=(1, 0, 0), z_dir=(0, 0, 1))):
        with Locations((0, 0)):
            CounterSinkHole(M3X0_5_1_D / 2, M3X0_5_1_CSINK_D / 2, counter_sink_angle=M3X0_5_1_CSINK_ANGLE)


solid = part.part
